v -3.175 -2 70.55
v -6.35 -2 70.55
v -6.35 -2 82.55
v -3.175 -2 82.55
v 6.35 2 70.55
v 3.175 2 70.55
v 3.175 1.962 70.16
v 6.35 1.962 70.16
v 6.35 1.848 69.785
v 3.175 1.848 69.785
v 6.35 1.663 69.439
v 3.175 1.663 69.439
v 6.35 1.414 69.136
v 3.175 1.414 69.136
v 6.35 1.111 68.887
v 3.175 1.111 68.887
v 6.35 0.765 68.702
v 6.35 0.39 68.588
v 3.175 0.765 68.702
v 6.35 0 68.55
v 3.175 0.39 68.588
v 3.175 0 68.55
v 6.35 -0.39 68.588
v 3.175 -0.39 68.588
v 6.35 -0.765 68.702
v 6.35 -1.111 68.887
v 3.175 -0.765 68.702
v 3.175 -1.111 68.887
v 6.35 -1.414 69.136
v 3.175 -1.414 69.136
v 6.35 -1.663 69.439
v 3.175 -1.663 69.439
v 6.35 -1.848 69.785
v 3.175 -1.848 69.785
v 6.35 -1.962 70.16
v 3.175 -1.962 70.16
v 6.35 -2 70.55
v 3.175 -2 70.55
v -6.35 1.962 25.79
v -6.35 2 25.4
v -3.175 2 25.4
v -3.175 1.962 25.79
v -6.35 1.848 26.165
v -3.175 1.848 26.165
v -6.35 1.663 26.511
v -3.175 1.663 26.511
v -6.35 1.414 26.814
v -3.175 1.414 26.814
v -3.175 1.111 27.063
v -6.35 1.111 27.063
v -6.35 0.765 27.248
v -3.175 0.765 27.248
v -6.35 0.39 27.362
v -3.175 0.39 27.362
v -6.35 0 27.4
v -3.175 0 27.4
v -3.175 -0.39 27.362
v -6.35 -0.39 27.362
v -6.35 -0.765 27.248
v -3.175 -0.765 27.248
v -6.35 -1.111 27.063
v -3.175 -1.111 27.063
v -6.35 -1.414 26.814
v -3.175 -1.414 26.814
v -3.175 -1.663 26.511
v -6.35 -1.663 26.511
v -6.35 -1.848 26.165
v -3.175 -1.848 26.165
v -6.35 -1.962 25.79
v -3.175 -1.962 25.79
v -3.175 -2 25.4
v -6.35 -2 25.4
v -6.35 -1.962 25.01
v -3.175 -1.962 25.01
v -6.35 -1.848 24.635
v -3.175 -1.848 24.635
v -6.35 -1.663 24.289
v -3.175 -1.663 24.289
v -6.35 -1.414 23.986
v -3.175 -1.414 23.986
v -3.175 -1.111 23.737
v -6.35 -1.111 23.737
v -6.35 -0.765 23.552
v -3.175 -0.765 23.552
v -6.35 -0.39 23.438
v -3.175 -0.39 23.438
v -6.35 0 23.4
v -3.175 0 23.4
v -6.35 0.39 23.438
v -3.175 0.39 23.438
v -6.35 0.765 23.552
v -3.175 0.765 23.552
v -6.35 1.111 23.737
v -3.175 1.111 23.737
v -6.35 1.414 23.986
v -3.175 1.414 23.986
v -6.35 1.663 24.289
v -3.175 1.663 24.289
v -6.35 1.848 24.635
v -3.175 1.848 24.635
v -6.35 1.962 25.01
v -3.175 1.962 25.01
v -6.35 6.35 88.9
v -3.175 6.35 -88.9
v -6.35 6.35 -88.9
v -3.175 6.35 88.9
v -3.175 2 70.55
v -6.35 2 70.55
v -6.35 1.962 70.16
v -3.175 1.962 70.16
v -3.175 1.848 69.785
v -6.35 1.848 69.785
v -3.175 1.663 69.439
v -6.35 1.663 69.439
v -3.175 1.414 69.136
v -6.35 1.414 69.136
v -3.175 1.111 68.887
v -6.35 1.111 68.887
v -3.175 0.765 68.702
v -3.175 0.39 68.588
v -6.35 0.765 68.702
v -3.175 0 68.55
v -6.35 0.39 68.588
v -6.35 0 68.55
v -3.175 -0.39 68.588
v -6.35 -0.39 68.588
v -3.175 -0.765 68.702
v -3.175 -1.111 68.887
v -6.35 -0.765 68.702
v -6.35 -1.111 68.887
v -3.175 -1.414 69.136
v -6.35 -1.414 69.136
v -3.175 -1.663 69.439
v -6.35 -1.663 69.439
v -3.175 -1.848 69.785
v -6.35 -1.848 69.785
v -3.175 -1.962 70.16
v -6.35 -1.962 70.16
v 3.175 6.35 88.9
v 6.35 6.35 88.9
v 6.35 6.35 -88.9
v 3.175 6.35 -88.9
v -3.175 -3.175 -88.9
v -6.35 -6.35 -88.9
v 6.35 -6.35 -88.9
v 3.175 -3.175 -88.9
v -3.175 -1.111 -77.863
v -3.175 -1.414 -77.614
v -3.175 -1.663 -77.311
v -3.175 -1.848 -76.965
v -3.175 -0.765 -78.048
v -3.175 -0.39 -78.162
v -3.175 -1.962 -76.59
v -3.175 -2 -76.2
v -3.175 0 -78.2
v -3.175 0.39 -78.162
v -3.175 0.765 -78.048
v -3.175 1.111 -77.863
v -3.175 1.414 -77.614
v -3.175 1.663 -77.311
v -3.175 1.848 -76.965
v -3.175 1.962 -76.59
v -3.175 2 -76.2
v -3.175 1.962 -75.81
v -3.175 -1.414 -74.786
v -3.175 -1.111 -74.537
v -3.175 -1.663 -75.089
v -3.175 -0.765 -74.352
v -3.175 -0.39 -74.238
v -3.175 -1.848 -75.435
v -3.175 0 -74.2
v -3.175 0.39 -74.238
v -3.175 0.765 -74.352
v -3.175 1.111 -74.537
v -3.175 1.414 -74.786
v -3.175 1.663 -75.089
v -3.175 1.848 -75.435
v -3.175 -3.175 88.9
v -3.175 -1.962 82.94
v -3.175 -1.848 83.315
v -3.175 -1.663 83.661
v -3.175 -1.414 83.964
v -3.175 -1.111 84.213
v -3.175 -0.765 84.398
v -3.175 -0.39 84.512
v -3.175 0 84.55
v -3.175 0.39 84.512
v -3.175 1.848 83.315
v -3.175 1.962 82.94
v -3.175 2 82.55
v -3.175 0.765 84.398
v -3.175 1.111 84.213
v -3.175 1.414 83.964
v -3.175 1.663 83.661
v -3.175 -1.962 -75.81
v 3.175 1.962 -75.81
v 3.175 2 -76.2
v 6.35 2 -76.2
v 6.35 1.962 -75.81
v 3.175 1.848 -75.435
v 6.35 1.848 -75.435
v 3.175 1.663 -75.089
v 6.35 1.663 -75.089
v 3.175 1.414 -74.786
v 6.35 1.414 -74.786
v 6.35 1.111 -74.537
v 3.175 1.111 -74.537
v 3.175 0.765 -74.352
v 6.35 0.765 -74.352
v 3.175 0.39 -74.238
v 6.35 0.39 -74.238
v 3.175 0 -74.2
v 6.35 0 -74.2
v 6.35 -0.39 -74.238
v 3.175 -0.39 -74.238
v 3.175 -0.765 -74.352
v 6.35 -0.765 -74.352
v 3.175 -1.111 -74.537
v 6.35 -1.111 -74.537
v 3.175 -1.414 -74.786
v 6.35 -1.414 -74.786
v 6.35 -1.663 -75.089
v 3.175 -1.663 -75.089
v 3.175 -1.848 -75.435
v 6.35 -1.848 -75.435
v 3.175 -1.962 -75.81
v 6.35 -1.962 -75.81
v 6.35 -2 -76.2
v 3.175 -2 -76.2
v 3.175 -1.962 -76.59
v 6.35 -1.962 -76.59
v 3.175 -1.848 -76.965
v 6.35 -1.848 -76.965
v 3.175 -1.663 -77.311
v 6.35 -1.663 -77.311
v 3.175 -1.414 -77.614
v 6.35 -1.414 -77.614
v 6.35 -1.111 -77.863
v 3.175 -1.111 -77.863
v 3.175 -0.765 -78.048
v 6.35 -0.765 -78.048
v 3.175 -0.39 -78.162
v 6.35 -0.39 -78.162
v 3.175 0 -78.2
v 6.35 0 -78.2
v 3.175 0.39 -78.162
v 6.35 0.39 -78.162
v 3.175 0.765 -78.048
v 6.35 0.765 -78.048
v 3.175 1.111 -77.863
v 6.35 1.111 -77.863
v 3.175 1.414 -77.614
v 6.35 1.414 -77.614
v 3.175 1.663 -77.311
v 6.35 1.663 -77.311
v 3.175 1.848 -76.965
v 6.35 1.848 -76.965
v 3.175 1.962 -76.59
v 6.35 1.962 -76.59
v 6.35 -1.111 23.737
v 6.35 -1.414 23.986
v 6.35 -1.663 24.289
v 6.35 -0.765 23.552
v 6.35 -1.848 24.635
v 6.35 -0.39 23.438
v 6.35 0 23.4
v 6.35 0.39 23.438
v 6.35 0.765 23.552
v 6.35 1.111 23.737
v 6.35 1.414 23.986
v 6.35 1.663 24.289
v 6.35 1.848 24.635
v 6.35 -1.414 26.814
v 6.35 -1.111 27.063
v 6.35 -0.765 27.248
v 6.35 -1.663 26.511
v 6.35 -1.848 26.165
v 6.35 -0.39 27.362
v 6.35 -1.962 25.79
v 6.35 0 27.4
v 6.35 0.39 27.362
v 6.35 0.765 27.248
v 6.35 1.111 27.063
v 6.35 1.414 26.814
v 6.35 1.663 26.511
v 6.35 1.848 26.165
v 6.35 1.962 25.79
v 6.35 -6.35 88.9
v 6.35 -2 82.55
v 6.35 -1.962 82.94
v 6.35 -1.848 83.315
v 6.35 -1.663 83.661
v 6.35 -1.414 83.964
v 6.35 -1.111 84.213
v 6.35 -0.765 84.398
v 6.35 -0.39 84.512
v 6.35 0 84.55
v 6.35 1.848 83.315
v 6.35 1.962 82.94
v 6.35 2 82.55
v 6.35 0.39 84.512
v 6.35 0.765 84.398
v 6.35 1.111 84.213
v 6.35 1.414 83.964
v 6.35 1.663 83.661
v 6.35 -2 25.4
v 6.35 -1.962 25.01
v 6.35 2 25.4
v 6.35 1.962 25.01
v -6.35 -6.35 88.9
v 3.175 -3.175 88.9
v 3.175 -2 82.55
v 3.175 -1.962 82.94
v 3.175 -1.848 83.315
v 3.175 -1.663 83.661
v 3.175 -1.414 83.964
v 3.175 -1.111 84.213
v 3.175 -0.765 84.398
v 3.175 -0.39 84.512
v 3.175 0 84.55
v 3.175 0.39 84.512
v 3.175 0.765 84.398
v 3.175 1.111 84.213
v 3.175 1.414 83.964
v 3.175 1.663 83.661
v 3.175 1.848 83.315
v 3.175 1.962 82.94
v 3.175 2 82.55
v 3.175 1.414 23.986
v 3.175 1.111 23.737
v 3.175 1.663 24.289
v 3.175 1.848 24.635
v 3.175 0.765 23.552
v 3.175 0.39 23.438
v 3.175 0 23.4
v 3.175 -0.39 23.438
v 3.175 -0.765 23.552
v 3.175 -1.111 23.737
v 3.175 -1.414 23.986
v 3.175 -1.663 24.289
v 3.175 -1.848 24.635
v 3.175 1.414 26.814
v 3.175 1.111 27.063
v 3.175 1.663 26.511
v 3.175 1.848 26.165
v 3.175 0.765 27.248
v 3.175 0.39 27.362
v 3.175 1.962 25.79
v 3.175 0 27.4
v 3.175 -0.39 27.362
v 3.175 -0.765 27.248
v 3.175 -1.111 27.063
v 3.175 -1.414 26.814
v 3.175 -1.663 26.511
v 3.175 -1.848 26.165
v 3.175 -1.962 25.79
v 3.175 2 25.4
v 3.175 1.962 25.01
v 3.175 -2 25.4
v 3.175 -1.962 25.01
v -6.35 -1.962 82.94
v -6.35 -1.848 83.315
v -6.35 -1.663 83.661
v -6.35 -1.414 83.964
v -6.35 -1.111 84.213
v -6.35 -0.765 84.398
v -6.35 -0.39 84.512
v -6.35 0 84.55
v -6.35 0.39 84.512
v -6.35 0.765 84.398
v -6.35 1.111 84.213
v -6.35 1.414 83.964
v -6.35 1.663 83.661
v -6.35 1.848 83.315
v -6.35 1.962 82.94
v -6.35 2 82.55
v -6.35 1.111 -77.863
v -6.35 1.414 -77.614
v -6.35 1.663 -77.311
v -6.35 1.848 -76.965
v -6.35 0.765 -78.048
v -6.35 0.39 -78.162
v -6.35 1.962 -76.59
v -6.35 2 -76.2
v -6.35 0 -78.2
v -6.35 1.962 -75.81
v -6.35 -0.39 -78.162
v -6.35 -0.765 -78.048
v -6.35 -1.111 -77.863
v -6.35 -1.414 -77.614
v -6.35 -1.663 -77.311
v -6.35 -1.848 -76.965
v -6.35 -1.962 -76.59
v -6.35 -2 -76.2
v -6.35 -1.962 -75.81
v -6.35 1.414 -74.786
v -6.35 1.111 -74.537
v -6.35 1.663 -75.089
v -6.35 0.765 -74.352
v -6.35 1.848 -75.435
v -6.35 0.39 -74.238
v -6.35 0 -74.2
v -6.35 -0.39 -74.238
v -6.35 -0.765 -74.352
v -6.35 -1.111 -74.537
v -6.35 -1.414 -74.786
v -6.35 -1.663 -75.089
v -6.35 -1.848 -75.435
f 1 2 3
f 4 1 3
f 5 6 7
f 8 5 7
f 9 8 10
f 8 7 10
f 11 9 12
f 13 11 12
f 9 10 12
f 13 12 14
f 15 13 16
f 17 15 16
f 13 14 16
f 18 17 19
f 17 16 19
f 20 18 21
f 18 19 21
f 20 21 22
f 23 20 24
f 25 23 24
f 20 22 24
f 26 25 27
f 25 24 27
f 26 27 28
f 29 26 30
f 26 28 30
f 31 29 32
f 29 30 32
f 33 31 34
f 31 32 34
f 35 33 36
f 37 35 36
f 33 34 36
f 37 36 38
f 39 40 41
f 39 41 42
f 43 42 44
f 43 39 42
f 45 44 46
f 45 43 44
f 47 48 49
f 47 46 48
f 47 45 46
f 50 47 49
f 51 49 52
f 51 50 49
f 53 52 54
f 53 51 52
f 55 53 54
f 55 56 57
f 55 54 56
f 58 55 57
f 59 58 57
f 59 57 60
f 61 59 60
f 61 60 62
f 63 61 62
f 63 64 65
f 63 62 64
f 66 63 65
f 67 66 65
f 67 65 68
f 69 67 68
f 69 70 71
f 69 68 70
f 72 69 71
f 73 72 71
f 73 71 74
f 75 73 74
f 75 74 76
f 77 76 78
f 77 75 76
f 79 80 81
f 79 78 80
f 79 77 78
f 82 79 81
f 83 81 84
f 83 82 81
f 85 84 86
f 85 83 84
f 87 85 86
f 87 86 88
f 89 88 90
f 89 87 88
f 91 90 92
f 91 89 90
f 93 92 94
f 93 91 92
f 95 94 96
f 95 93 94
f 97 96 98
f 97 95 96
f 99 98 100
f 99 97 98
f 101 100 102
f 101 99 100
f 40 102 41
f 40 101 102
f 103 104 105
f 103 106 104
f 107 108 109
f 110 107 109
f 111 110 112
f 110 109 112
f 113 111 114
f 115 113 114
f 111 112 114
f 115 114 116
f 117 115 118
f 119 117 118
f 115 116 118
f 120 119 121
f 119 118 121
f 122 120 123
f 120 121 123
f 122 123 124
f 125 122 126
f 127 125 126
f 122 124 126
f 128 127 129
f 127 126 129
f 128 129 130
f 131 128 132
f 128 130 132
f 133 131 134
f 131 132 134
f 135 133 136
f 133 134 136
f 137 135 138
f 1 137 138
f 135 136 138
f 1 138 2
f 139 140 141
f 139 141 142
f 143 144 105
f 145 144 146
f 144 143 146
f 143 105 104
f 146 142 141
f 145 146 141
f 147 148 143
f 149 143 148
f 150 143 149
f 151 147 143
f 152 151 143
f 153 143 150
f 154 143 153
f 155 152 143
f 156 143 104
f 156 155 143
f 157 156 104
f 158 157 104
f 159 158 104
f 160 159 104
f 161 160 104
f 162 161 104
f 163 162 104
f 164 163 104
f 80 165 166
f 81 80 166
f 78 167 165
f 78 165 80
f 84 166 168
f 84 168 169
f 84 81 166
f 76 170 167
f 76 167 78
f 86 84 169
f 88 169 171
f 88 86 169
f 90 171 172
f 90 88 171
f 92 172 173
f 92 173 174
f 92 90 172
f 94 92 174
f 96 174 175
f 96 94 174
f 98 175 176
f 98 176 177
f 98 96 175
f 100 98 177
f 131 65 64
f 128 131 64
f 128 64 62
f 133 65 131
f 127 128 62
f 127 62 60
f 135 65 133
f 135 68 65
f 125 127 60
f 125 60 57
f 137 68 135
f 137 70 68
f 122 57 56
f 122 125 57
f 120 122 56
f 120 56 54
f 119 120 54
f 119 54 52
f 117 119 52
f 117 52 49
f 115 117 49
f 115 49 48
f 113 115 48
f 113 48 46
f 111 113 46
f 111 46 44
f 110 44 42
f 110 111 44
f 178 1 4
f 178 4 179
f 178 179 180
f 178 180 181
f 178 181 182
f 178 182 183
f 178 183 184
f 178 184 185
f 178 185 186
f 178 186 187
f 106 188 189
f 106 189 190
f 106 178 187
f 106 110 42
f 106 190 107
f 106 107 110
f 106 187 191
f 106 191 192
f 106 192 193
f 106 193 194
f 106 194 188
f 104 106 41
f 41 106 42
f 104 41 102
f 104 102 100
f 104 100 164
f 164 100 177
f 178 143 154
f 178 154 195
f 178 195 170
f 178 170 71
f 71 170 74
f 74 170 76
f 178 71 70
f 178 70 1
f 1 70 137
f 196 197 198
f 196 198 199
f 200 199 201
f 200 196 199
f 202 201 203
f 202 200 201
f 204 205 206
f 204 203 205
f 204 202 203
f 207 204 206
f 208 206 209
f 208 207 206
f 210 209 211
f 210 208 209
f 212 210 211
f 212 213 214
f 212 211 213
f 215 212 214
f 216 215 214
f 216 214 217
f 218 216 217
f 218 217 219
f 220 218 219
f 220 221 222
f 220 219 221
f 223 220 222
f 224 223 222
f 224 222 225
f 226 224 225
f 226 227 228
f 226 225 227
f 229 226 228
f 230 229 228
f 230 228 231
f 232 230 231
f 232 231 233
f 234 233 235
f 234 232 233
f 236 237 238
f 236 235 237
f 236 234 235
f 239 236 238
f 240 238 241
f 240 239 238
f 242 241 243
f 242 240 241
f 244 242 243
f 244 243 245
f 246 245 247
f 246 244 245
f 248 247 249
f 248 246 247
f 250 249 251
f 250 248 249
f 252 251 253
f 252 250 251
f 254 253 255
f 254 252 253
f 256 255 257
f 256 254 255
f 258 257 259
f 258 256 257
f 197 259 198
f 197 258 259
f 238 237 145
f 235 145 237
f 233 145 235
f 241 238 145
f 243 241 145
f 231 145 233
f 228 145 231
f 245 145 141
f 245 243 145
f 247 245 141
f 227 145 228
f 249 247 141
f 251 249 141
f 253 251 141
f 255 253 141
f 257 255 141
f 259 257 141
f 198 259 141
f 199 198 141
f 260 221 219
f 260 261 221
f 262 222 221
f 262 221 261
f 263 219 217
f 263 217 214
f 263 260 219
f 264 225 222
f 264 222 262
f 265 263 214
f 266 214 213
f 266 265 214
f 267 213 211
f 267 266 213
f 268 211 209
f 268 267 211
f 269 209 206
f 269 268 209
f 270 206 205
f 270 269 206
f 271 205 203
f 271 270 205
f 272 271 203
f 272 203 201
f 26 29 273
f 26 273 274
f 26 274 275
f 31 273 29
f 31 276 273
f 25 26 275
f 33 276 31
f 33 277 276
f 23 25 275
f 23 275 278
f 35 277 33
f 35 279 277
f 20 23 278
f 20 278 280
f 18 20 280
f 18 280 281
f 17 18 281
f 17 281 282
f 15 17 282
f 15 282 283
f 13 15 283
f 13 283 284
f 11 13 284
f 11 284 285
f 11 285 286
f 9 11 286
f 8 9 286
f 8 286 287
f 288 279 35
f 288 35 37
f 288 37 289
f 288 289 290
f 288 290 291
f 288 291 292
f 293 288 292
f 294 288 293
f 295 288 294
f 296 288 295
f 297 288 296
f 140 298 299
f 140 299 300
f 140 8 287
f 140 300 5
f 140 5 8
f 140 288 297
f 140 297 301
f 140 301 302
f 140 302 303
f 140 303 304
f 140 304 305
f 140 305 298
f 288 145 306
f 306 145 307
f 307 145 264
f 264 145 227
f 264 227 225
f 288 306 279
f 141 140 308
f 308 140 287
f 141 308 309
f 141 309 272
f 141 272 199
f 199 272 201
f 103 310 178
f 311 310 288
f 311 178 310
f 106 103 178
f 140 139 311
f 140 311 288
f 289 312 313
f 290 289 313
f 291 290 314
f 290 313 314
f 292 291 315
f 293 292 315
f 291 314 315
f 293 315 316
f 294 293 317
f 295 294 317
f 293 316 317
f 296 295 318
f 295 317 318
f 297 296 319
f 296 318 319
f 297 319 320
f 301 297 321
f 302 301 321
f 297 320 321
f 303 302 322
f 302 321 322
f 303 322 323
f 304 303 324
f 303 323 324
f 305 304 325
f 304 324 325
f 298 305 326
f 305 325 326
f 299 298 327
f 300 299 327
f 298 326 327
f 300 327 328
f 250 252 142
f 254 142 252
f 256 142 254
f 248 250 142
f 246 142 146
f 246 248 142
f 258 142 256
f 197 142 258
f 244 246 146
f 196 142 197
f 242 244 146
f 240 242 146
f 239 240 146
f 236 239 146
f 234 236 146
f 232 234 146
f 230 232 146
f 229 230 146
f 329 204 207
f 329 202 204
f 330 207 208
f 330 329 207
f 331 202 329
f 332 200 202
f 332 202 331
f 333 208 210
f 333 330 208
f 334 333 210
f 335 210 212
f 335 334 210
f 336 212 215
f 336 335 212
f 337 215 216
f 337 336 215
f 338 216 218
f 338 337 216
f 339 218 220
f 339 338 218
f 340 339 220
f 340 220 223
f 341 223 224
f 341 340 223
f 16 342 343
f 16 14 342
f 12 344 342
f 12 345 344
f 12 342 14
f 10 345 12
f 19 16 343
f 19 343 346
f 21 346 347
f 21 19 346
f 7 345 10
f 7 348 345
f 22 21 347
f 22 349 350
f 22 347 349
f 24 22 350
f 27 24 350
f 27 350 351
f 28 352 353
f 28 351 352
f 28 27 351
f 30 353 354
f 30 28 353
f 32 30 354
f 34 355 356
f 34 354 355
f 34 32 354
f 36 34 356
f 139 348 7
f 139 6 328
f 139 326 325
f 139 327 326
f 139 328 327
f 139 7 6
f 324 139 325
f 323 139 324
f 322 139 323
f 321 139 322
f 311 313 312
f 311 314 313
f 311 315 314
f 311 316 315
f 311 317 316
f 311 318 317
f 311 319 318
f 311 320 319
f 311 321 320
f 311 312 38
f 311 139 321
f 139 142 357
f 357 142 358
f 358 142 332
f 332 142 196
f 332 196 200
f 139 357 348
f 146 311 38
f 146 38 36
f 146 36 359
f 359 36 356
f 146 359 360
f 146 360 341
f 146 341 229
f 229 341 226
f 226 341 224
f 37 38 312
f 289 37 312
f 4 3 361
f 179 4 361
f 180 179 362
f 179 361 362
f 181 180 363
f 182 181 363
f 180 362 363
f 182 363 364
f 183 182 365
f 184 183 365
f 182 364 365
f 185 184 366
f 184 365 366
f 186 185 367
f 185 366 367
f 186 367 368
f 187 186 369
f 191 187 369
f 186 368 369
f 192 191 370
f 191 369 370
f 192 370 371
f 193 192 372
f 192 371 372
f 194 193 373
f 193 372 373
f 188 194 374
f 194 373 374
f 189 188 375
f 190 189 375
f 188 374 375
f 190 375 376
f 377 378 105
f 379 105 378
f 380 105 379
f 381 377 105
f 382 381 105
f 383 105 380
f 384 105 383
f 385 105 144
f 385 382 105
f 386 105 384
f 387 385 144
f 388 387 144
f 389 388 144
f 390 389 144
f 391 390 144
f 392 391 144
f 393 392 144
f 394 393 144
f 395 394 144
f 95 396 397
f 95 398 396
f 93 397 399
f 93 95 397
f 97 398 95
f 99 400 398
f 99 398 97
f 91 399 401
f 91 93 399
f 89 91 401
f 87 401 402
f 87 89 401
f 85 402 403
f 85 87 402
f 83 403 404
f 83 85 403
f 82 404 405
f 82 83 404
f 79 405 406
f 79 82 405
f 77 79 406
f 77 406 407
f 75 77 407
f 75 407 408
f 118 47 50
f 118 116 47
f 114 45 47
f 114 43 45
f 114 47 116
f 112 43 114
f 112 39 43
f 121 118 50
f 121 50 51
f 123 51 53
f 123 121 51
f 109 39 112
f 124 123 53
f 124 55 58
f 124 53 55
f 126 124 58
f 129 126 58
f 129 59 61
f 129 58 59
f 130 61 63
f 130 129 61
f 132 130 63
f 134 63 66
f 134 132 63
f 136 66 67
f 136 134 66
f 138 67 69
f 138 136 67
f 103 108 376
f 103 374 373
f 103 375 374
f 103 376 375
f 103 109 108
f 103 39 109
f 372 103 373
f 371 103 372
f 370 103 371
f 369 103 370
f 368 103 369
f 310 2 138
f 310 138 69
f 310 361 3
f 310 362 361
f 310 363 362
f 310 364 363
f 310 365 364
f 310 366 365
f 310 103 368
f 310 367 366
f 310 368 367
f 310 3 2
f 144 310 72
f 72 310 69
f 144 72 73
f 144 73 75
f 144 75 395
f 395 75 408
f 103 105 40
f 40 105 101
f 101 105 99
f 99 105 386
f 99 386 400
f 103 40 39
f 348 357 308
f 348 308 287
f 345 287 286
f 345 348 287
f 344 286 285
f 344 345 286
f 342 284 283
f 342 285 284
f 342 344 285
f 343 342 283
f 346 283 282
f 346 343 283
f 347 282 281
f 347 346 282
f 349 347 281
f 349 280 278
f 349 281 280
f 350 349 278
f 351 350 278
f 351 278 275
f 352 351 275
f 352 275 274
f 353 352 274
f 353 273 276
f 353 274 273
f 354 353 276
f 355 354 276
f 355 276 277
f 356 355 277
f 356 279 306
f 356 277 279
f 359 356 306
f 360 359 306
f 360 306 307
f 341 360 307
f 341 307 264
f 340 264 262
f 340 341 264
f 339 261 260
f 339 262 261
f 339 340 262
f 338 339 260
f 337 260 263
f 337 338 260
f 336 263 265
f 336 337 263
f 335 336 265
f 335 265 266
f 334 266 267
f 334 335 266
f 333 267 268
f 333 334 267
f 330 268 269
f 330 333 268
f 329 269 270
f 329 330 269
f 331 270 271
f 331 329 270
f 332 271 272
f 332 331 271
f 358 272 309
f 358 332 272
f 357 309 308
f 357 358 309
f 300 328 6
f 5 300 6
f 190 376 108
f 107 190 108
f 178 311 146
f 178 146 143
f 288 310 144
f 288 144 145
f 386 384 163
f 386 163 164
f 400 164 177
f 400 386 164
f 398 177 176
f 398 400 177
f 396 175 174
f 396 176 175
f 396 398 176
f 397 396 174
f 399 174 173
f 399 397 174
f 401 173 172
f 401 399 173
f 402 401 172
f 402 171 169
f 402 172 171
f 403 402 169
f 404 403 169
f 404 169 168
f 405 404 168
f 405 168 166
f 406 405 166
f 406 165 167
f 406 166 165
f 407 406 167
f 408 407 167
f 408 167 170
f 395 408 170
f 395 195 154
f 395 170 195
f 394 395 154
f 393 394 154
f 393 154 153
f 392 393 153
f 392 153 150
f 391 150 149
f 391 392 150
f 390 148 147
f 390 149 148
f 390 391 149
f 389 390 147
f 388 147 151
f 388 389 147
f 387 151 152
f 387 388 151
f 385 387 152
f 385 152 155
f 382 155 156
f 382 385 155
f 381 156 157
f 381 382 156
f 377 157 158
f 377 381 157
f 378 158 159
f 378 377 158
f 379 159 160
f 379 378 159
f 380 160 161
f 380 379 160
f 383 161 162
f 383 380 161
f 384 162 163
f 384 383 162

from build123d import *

# Parameters (mm, degrees)
BOSS_EXTRUDE1_DEPTH     = 88.9
CUT_EXTRUDE1_DEPTH      = 91.02678768
CUT_EXTRUDE1_DEPTH_BACK = 91.02678768
SKETCH3_R               = 2


with BuildPart() as part:
    # Sketch2 → Boss-Extrude1 (new, symmetric)
    with BuildSketch(Plane.XY):
        Polygon((-6.35, 6.35), (-6.35, -6.35), (6.35, -6.35), (6.35, 6.35), (3.175, 6.35), (3.175, -3.175), (-3.175, -3.175), (-3.175, 6.35), align=None)
    extrude(amount=BOSS_EXTRUDE1_DEPTH, both=True)

    # Sketch3 → Cut-Extrude1 (cut, two sides: drawn at the far end of the back side and taken through both)
    with BuildSketch(Plane(origin=(6.35, 0, 0), x_dir=(0, 0, -1), z_dir=(1, 0, 0)).offset(-CUT_EXTRUDE1_DEPTH_BACK)):
        with Locations(Location((-25.4, 0, 0), (0, 0, 90))):
            Circle(SKETCH3_R)
        with Locations(Location((76.2, 0, 0), (0, 0, 90))):
            Circle(SKETCH3_R)
        with BuildLine():
            Line((-82.55, 2), (-70.55, 2))
            ThreePointArc((-70.55, 2), (-68.55, 0), (-70.55, -2))
            Line((-70.55, -2), (-82.55, -2))
            ThreePointArc((-82.55, -2), (-84.55, 0), (-82.55, 2))
        make_face()
    extrude(amount=CUT_EXTRUDE1_DEPTH + CUT_EXTRUDE1_DEPTH_BACK, mode=Mode.SUBTRACT)


solid = part.part
